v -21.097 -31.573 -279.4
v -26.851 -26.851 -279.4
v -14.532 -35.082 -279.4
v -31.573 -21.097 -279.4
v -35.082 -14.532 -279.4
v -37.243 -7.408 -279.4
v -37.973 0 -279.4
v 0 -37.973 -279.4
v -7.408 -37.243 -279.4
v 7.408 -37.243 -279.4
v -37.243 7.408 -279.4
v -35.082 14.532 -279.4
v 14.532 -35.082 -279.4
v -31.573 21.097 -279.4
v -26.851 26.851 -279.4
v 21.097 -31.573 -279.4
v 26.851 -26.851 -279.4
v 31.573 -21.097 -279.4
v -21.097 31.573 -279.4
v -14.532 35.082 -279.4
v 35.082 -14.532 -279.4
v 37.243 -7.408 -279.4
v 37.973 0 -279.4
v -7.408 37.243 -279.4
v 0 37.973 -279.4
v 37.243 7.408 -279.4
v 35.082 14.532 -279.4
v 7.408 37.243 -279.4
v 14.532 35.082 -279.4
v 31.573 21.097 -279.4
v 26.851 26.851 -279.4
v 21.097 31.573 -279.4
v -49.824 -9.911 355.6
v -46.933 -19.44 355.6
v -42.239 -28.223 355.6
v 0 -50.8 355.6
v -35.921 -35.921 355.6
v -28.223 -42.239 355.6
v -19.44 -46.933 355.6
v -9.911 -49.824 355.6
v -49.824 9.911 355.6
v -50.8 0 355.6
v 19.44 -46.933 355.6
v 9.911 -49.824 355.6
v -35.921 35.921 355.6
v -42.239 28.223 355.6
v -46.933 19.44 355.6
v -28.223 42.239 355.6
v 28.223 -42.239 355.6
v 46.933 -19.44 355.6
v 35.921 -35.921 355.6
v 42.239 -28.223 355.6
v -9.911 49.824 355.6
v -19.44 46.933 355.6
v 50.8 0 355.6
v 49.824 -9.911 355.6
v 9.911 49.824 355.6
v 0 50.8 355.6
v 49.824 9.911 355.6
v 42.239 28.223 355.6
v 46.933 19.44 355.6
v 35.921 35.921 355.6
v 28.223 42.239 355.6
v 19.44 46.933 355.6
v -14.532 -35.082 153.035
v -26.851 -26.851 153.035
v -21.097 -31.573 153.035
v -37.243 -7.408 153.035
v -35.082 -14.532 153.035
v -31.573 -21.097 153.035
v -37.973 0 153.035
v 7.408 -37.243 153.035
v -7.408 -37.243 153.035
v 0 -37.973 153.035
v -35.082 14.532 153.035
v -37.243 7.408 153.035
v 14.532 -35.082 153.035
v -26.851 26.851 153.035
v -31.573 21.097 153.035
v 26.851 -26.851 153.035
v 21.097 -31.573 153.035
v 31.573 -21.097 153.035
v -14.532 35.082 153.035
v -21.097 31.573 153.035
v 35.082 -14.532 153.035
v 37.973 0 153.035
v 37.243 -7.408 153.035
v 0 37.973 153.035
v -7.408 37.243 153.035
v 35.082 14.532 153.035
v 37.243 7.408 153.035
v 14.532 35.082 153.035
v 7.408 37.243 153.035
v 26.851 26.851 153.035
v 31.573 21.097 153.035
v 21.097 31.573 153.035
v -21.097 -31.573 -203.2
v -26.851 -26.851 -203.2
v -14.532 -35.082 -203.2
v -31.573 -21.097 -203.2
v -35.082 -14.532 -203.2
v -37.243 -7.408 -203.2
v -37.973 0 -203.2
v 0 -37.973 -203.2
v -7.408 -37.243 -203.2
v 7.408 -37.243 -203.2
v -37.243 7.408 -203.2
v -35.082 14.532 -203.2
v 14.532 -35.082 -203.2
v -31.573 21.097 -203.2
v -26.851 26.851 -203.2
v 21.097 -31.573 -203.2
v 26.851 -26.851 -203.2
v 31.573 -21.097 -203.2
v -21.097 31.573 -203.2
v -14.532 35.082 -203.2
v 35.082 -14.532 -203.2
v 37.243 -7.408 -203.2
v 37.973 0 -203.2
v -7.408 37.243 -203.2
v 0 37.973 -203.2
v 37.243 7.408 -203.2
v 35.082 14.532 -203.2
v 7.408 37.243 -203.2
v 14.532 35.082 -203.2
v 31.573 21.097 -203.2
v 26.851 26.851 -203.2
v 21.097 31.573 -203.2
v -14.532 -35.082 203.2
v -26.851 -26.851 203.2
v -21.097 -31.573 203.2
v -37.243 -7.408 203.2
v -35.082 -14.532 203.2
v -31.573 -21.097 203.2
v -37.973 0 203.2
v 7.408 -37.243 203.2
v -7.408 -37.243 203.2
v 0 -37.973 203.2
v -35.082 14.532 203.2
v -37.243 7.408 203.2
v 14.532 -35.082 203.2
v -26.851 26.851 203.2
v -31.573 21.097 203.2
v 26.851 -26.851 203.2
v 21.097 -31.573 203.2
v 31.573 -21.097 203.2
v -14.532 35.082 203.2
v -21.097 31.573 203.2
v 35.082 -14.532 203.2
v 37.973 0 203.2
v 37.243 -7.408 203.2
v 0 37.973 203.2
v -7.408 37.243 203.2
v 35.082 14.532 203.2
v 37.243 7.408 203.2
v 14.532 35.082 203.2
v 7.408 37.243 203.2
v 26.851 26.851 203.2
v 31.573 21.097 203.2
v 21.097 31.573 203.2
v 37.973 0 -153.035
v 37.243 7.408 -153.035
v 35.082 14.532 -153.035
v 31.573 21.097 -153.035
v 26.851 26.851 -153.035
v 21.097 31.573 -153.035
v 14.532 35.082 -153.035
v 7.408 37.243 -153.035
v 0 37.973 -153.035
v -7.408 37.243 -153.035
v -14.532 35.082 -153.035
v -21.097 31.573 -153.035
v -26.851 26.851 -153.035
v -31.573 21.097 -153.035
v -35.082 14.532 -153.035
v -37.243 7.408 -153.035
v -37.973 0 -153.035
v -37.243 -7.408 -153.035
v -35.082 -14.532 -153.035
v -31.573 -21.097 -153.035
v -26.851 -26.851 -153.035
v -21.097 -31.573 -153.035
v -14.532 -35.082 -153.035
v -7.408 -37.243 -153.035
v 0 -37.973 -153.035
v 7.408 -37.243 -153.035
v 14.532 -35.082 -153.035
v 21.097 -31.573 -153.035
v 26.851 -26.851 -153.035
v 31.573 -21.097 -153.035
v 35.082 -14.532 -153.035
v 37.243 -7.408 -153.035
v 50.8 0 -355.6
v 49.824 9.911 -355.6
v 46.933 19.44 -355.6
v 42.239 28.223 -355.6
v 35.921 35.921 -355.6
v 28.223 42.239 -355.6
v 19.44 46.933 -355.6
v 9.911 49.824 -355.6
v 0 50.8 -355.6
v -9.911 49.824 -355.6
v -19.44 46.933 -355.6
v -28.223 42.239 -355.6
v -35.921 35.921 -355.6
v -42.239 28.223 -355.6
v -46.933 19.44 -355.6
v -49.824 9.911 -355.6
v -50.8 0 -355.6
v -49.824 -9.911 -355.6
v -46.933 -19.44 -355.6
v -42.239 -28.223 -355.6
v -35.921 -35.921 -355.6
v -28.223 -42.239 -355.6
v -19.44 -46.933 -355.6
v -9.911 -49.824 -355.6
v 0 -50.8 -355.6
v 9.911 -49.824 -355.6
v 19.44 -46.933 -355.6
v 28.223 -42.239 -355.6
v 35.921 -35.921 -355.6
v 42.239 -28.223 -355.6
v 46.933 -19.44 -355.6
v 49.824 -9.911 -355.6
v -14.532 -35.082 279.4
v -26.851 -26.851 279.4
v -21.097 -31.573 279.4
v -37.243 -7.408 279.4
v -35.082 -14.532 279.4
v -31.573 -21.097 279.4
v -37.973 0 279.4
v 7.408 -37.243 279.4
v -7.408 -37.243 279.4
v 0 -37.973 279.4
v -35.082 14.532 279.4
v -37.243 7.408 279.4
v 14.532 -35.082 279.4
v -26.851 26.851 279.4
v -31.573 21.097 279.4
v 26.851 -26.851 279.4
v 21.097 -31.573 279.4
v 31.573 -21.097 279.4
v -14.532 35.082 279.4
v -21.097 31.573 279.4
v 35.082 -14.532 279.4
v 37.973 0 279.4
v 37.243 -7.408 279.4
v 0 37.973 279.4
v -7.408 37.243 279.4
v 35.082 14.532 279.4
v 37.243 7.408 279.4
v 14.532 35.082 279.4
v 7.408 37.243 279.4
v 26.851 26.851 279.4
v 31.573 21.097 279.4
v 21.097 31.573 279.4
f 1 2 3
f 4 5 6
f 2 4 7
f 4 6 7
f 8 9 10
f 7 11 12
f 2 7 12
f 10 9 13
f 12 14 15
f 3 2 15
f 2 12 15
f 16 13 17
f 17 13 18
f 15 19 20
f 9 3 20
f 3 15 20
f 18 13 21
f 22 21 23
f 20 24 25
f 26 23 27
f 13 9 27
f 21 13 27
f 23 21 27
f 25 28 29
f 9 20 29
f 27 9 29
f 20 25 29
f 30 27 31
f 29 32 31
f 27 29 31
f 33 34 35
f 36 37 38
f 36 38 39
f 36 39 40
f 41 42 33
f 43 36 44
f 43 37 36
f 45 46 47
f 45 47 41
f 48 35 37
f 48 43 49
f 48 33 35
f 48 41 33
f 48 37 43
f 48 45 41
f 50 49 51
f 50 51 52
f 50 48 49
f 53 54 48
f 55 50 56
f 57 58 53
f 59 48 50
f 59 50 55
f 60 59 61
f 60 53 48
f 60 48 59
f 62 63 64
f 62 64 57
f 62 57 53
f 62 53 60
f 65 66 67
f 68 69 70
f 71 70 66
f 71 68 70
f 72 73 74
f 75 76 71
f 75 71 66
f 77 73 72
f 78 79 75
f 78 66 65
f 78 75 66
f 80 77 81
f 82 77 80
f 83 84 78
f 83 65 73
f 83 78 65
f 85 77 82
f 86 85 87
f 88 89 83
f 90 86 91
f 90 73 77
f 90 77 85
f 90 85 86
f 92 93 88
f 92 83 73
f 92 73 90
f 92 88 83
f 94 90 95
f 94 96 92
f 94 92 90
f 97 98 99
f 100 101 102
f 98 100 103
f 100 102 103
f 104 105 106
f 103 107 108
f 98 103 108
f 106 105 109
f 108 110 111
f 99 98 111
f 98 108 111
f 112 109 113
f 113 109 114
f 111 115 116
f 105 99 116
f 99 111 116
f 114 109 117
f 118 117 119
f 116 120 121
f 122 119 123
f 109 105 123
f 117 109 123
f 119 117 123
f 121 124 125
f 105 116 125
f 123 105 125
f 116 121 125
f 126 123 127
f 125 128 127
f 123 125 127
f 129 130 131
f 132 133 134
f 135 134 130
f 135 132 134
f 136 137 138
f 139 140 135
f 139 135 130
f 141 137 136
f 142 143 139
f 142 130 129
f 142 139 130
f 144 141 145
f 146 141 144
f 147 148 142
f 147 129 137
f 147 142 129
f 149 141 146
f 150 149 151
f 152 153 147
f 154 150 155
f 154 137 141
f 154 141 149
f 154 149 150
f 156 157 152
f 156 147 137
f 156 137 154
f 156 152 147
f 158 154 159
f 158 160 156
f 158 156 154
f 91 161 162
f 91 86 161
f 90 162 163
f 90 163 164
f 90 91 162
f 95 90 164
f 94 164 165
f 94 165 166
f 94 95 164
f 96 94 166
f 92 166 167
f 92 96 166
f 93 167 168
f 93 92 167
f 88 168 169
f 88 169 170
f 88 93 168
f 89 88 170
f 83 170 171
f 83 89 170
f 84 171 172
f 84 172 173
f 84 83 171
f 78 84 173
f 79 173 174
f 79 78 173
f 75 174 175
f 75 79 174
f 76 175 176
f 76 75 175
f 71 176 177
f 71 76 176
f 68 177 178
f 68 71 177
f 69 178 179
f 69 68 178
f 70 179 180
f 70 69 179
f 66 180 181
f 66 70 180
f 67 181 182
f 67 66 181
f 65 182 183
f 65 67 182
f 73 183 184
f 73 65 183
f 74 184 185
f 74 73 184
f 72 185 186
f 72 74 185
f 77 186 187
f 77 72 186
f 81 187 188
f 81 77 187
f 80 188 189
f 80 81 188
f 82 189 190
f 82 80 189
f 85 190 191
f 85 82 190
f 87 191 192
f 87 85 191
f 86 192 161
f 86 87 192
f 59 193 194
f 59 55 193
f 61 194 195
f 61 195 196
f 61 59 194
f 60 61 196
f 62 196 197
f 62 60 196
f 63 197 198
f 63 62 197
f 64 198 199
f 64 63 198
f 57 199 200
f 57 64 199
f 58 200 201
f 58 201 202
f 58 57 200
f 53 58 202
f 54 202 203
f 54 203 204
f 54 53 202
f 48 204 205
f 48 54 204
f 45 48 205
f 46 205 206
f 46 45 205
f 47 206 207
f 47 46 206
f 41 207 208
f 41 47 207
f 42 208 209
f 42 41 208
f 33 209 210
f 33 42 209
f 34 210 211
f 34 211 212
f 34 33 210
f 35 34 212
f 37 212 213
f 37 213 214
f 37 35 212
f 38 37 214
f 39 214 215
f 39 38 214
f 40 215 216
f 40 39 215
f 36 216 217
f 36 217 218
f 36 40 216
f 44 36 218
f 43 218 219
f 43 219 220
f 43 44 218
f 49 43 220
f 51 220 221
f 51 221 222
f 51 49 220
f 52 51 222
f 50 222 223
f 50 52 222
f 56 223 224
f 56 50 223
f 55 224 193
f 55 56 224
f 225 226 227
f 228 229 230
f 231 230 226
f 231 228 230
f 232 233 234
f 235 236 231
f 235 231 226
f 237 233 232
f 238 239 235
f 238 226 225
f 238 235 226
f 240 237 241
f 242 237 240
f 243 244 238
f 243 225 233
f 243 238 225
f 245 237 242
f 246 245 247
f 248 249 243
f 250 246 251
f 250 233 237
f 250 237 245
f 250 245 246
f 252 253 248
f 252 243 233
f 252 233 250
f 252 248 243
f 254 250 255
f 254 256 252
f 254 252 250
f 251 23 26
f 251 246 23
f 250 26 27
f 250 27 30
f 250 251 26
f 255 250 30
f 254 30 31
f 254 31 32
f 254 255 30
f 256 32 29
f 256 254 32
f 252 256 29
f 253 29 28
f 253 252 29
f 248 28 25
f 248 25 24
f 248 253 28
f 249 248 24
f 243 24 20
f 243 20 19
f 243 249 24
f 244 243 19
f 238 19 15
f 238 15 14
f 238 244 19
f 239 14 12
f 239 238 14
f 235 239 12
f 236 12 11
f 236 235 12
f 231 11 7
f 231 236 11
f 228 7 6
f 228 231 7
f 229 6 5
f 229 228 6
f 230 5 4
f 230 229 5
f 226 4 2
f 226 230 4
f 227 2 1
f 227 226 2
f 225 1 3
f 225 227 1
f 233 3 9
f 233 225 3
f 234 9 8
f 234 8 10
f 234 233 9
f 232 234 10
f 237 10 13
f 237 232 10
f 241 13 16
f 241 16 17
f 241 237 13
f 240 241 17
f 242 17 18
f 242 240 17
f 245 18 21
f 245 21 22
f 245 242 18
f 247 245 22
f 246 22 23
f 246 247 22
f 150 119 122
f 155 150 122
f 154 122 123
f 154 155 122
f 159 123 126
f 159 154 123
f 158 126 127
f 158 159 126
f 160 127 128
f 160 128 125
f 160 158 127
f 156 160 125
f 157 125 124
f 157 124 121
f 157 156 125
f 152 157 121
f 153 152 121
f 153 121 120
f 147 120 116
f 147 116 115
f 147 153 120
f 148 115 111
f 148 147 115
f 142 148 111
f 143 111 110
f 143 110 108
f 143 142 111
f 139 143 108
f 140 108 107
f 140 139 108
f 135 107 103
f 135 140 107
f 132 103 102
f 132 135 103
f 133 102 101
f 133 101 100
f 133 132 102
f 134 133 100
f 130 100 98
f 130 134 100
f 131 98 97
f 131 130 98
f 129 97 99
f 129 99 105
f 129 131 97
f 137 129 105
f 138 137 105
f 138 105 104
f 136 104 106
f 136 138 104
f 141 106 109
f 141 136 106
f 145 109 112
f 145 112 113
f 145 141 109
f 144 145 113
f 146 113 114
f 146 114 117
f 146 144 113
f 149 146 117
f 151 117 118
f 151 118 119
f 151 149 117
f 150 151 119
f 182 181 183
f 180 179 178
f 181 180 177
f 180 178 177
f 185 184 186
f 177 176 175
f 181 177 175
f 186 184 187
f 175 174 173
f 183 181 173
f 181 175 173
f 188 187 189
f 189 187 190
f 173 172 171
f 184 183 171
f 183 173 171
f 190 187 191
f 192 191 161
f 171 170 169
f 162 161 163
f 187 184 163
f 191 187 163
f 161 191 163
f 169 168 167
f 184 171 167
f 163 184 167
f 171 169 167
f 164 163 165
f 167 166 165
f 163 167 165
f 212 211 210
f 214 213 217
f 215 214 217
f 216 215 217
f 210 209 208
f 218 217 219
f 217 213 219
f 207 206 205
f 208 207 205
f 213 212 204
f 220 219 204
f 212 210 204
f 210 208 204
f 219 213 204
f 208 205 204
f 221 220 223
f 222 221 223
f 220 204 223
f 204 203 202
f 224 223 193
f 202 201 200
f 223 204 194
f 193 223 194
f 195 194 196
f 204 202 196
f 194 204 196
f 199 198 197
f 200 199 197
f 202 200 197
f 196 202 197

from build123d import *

# Parameters (mm, degrees)
F0_R     = 37.973
F1_DEPTH = 153.035
F2_DEPTH = 203.2
F3_DEPTH = 279.4
F4_R     = 50.8
F5_DEPTH = 355.6


with BuildPart() as f1:
    # F0 (on Top) → F1 (new body, symmetric)
    with BuildSketch(Plane.XY):
        Circle(F0_R)
    extrude(amount=F1_DEPTH, both=True)


with BuildPart() as f2:
    # F0 (on Top) → F2 (new body, symmetric)
    with BuildSketch(Plane.XY):
        Circle(F0_R)
    extrude(amount=F2_DEPTH, both=True)


with BuildPart() as f3:
    # F0 (on Top) → F3 (new body, symmetric)
    with BuildSketch(Plane.XY):
        Circle(F0_R)
    extrude(amount=F3_DEPTH, both=True)


with BuildPart() as f5:
    # F4 (on Top) → F5 (new body, symmetric)
    with BuildSketch(Plane.XY):
        Circle(F4_R)
    extrude(amount=F5_DEPTH, both=True)


solid = Compound([f1.part, f2.part, f3.part, f5.part])
